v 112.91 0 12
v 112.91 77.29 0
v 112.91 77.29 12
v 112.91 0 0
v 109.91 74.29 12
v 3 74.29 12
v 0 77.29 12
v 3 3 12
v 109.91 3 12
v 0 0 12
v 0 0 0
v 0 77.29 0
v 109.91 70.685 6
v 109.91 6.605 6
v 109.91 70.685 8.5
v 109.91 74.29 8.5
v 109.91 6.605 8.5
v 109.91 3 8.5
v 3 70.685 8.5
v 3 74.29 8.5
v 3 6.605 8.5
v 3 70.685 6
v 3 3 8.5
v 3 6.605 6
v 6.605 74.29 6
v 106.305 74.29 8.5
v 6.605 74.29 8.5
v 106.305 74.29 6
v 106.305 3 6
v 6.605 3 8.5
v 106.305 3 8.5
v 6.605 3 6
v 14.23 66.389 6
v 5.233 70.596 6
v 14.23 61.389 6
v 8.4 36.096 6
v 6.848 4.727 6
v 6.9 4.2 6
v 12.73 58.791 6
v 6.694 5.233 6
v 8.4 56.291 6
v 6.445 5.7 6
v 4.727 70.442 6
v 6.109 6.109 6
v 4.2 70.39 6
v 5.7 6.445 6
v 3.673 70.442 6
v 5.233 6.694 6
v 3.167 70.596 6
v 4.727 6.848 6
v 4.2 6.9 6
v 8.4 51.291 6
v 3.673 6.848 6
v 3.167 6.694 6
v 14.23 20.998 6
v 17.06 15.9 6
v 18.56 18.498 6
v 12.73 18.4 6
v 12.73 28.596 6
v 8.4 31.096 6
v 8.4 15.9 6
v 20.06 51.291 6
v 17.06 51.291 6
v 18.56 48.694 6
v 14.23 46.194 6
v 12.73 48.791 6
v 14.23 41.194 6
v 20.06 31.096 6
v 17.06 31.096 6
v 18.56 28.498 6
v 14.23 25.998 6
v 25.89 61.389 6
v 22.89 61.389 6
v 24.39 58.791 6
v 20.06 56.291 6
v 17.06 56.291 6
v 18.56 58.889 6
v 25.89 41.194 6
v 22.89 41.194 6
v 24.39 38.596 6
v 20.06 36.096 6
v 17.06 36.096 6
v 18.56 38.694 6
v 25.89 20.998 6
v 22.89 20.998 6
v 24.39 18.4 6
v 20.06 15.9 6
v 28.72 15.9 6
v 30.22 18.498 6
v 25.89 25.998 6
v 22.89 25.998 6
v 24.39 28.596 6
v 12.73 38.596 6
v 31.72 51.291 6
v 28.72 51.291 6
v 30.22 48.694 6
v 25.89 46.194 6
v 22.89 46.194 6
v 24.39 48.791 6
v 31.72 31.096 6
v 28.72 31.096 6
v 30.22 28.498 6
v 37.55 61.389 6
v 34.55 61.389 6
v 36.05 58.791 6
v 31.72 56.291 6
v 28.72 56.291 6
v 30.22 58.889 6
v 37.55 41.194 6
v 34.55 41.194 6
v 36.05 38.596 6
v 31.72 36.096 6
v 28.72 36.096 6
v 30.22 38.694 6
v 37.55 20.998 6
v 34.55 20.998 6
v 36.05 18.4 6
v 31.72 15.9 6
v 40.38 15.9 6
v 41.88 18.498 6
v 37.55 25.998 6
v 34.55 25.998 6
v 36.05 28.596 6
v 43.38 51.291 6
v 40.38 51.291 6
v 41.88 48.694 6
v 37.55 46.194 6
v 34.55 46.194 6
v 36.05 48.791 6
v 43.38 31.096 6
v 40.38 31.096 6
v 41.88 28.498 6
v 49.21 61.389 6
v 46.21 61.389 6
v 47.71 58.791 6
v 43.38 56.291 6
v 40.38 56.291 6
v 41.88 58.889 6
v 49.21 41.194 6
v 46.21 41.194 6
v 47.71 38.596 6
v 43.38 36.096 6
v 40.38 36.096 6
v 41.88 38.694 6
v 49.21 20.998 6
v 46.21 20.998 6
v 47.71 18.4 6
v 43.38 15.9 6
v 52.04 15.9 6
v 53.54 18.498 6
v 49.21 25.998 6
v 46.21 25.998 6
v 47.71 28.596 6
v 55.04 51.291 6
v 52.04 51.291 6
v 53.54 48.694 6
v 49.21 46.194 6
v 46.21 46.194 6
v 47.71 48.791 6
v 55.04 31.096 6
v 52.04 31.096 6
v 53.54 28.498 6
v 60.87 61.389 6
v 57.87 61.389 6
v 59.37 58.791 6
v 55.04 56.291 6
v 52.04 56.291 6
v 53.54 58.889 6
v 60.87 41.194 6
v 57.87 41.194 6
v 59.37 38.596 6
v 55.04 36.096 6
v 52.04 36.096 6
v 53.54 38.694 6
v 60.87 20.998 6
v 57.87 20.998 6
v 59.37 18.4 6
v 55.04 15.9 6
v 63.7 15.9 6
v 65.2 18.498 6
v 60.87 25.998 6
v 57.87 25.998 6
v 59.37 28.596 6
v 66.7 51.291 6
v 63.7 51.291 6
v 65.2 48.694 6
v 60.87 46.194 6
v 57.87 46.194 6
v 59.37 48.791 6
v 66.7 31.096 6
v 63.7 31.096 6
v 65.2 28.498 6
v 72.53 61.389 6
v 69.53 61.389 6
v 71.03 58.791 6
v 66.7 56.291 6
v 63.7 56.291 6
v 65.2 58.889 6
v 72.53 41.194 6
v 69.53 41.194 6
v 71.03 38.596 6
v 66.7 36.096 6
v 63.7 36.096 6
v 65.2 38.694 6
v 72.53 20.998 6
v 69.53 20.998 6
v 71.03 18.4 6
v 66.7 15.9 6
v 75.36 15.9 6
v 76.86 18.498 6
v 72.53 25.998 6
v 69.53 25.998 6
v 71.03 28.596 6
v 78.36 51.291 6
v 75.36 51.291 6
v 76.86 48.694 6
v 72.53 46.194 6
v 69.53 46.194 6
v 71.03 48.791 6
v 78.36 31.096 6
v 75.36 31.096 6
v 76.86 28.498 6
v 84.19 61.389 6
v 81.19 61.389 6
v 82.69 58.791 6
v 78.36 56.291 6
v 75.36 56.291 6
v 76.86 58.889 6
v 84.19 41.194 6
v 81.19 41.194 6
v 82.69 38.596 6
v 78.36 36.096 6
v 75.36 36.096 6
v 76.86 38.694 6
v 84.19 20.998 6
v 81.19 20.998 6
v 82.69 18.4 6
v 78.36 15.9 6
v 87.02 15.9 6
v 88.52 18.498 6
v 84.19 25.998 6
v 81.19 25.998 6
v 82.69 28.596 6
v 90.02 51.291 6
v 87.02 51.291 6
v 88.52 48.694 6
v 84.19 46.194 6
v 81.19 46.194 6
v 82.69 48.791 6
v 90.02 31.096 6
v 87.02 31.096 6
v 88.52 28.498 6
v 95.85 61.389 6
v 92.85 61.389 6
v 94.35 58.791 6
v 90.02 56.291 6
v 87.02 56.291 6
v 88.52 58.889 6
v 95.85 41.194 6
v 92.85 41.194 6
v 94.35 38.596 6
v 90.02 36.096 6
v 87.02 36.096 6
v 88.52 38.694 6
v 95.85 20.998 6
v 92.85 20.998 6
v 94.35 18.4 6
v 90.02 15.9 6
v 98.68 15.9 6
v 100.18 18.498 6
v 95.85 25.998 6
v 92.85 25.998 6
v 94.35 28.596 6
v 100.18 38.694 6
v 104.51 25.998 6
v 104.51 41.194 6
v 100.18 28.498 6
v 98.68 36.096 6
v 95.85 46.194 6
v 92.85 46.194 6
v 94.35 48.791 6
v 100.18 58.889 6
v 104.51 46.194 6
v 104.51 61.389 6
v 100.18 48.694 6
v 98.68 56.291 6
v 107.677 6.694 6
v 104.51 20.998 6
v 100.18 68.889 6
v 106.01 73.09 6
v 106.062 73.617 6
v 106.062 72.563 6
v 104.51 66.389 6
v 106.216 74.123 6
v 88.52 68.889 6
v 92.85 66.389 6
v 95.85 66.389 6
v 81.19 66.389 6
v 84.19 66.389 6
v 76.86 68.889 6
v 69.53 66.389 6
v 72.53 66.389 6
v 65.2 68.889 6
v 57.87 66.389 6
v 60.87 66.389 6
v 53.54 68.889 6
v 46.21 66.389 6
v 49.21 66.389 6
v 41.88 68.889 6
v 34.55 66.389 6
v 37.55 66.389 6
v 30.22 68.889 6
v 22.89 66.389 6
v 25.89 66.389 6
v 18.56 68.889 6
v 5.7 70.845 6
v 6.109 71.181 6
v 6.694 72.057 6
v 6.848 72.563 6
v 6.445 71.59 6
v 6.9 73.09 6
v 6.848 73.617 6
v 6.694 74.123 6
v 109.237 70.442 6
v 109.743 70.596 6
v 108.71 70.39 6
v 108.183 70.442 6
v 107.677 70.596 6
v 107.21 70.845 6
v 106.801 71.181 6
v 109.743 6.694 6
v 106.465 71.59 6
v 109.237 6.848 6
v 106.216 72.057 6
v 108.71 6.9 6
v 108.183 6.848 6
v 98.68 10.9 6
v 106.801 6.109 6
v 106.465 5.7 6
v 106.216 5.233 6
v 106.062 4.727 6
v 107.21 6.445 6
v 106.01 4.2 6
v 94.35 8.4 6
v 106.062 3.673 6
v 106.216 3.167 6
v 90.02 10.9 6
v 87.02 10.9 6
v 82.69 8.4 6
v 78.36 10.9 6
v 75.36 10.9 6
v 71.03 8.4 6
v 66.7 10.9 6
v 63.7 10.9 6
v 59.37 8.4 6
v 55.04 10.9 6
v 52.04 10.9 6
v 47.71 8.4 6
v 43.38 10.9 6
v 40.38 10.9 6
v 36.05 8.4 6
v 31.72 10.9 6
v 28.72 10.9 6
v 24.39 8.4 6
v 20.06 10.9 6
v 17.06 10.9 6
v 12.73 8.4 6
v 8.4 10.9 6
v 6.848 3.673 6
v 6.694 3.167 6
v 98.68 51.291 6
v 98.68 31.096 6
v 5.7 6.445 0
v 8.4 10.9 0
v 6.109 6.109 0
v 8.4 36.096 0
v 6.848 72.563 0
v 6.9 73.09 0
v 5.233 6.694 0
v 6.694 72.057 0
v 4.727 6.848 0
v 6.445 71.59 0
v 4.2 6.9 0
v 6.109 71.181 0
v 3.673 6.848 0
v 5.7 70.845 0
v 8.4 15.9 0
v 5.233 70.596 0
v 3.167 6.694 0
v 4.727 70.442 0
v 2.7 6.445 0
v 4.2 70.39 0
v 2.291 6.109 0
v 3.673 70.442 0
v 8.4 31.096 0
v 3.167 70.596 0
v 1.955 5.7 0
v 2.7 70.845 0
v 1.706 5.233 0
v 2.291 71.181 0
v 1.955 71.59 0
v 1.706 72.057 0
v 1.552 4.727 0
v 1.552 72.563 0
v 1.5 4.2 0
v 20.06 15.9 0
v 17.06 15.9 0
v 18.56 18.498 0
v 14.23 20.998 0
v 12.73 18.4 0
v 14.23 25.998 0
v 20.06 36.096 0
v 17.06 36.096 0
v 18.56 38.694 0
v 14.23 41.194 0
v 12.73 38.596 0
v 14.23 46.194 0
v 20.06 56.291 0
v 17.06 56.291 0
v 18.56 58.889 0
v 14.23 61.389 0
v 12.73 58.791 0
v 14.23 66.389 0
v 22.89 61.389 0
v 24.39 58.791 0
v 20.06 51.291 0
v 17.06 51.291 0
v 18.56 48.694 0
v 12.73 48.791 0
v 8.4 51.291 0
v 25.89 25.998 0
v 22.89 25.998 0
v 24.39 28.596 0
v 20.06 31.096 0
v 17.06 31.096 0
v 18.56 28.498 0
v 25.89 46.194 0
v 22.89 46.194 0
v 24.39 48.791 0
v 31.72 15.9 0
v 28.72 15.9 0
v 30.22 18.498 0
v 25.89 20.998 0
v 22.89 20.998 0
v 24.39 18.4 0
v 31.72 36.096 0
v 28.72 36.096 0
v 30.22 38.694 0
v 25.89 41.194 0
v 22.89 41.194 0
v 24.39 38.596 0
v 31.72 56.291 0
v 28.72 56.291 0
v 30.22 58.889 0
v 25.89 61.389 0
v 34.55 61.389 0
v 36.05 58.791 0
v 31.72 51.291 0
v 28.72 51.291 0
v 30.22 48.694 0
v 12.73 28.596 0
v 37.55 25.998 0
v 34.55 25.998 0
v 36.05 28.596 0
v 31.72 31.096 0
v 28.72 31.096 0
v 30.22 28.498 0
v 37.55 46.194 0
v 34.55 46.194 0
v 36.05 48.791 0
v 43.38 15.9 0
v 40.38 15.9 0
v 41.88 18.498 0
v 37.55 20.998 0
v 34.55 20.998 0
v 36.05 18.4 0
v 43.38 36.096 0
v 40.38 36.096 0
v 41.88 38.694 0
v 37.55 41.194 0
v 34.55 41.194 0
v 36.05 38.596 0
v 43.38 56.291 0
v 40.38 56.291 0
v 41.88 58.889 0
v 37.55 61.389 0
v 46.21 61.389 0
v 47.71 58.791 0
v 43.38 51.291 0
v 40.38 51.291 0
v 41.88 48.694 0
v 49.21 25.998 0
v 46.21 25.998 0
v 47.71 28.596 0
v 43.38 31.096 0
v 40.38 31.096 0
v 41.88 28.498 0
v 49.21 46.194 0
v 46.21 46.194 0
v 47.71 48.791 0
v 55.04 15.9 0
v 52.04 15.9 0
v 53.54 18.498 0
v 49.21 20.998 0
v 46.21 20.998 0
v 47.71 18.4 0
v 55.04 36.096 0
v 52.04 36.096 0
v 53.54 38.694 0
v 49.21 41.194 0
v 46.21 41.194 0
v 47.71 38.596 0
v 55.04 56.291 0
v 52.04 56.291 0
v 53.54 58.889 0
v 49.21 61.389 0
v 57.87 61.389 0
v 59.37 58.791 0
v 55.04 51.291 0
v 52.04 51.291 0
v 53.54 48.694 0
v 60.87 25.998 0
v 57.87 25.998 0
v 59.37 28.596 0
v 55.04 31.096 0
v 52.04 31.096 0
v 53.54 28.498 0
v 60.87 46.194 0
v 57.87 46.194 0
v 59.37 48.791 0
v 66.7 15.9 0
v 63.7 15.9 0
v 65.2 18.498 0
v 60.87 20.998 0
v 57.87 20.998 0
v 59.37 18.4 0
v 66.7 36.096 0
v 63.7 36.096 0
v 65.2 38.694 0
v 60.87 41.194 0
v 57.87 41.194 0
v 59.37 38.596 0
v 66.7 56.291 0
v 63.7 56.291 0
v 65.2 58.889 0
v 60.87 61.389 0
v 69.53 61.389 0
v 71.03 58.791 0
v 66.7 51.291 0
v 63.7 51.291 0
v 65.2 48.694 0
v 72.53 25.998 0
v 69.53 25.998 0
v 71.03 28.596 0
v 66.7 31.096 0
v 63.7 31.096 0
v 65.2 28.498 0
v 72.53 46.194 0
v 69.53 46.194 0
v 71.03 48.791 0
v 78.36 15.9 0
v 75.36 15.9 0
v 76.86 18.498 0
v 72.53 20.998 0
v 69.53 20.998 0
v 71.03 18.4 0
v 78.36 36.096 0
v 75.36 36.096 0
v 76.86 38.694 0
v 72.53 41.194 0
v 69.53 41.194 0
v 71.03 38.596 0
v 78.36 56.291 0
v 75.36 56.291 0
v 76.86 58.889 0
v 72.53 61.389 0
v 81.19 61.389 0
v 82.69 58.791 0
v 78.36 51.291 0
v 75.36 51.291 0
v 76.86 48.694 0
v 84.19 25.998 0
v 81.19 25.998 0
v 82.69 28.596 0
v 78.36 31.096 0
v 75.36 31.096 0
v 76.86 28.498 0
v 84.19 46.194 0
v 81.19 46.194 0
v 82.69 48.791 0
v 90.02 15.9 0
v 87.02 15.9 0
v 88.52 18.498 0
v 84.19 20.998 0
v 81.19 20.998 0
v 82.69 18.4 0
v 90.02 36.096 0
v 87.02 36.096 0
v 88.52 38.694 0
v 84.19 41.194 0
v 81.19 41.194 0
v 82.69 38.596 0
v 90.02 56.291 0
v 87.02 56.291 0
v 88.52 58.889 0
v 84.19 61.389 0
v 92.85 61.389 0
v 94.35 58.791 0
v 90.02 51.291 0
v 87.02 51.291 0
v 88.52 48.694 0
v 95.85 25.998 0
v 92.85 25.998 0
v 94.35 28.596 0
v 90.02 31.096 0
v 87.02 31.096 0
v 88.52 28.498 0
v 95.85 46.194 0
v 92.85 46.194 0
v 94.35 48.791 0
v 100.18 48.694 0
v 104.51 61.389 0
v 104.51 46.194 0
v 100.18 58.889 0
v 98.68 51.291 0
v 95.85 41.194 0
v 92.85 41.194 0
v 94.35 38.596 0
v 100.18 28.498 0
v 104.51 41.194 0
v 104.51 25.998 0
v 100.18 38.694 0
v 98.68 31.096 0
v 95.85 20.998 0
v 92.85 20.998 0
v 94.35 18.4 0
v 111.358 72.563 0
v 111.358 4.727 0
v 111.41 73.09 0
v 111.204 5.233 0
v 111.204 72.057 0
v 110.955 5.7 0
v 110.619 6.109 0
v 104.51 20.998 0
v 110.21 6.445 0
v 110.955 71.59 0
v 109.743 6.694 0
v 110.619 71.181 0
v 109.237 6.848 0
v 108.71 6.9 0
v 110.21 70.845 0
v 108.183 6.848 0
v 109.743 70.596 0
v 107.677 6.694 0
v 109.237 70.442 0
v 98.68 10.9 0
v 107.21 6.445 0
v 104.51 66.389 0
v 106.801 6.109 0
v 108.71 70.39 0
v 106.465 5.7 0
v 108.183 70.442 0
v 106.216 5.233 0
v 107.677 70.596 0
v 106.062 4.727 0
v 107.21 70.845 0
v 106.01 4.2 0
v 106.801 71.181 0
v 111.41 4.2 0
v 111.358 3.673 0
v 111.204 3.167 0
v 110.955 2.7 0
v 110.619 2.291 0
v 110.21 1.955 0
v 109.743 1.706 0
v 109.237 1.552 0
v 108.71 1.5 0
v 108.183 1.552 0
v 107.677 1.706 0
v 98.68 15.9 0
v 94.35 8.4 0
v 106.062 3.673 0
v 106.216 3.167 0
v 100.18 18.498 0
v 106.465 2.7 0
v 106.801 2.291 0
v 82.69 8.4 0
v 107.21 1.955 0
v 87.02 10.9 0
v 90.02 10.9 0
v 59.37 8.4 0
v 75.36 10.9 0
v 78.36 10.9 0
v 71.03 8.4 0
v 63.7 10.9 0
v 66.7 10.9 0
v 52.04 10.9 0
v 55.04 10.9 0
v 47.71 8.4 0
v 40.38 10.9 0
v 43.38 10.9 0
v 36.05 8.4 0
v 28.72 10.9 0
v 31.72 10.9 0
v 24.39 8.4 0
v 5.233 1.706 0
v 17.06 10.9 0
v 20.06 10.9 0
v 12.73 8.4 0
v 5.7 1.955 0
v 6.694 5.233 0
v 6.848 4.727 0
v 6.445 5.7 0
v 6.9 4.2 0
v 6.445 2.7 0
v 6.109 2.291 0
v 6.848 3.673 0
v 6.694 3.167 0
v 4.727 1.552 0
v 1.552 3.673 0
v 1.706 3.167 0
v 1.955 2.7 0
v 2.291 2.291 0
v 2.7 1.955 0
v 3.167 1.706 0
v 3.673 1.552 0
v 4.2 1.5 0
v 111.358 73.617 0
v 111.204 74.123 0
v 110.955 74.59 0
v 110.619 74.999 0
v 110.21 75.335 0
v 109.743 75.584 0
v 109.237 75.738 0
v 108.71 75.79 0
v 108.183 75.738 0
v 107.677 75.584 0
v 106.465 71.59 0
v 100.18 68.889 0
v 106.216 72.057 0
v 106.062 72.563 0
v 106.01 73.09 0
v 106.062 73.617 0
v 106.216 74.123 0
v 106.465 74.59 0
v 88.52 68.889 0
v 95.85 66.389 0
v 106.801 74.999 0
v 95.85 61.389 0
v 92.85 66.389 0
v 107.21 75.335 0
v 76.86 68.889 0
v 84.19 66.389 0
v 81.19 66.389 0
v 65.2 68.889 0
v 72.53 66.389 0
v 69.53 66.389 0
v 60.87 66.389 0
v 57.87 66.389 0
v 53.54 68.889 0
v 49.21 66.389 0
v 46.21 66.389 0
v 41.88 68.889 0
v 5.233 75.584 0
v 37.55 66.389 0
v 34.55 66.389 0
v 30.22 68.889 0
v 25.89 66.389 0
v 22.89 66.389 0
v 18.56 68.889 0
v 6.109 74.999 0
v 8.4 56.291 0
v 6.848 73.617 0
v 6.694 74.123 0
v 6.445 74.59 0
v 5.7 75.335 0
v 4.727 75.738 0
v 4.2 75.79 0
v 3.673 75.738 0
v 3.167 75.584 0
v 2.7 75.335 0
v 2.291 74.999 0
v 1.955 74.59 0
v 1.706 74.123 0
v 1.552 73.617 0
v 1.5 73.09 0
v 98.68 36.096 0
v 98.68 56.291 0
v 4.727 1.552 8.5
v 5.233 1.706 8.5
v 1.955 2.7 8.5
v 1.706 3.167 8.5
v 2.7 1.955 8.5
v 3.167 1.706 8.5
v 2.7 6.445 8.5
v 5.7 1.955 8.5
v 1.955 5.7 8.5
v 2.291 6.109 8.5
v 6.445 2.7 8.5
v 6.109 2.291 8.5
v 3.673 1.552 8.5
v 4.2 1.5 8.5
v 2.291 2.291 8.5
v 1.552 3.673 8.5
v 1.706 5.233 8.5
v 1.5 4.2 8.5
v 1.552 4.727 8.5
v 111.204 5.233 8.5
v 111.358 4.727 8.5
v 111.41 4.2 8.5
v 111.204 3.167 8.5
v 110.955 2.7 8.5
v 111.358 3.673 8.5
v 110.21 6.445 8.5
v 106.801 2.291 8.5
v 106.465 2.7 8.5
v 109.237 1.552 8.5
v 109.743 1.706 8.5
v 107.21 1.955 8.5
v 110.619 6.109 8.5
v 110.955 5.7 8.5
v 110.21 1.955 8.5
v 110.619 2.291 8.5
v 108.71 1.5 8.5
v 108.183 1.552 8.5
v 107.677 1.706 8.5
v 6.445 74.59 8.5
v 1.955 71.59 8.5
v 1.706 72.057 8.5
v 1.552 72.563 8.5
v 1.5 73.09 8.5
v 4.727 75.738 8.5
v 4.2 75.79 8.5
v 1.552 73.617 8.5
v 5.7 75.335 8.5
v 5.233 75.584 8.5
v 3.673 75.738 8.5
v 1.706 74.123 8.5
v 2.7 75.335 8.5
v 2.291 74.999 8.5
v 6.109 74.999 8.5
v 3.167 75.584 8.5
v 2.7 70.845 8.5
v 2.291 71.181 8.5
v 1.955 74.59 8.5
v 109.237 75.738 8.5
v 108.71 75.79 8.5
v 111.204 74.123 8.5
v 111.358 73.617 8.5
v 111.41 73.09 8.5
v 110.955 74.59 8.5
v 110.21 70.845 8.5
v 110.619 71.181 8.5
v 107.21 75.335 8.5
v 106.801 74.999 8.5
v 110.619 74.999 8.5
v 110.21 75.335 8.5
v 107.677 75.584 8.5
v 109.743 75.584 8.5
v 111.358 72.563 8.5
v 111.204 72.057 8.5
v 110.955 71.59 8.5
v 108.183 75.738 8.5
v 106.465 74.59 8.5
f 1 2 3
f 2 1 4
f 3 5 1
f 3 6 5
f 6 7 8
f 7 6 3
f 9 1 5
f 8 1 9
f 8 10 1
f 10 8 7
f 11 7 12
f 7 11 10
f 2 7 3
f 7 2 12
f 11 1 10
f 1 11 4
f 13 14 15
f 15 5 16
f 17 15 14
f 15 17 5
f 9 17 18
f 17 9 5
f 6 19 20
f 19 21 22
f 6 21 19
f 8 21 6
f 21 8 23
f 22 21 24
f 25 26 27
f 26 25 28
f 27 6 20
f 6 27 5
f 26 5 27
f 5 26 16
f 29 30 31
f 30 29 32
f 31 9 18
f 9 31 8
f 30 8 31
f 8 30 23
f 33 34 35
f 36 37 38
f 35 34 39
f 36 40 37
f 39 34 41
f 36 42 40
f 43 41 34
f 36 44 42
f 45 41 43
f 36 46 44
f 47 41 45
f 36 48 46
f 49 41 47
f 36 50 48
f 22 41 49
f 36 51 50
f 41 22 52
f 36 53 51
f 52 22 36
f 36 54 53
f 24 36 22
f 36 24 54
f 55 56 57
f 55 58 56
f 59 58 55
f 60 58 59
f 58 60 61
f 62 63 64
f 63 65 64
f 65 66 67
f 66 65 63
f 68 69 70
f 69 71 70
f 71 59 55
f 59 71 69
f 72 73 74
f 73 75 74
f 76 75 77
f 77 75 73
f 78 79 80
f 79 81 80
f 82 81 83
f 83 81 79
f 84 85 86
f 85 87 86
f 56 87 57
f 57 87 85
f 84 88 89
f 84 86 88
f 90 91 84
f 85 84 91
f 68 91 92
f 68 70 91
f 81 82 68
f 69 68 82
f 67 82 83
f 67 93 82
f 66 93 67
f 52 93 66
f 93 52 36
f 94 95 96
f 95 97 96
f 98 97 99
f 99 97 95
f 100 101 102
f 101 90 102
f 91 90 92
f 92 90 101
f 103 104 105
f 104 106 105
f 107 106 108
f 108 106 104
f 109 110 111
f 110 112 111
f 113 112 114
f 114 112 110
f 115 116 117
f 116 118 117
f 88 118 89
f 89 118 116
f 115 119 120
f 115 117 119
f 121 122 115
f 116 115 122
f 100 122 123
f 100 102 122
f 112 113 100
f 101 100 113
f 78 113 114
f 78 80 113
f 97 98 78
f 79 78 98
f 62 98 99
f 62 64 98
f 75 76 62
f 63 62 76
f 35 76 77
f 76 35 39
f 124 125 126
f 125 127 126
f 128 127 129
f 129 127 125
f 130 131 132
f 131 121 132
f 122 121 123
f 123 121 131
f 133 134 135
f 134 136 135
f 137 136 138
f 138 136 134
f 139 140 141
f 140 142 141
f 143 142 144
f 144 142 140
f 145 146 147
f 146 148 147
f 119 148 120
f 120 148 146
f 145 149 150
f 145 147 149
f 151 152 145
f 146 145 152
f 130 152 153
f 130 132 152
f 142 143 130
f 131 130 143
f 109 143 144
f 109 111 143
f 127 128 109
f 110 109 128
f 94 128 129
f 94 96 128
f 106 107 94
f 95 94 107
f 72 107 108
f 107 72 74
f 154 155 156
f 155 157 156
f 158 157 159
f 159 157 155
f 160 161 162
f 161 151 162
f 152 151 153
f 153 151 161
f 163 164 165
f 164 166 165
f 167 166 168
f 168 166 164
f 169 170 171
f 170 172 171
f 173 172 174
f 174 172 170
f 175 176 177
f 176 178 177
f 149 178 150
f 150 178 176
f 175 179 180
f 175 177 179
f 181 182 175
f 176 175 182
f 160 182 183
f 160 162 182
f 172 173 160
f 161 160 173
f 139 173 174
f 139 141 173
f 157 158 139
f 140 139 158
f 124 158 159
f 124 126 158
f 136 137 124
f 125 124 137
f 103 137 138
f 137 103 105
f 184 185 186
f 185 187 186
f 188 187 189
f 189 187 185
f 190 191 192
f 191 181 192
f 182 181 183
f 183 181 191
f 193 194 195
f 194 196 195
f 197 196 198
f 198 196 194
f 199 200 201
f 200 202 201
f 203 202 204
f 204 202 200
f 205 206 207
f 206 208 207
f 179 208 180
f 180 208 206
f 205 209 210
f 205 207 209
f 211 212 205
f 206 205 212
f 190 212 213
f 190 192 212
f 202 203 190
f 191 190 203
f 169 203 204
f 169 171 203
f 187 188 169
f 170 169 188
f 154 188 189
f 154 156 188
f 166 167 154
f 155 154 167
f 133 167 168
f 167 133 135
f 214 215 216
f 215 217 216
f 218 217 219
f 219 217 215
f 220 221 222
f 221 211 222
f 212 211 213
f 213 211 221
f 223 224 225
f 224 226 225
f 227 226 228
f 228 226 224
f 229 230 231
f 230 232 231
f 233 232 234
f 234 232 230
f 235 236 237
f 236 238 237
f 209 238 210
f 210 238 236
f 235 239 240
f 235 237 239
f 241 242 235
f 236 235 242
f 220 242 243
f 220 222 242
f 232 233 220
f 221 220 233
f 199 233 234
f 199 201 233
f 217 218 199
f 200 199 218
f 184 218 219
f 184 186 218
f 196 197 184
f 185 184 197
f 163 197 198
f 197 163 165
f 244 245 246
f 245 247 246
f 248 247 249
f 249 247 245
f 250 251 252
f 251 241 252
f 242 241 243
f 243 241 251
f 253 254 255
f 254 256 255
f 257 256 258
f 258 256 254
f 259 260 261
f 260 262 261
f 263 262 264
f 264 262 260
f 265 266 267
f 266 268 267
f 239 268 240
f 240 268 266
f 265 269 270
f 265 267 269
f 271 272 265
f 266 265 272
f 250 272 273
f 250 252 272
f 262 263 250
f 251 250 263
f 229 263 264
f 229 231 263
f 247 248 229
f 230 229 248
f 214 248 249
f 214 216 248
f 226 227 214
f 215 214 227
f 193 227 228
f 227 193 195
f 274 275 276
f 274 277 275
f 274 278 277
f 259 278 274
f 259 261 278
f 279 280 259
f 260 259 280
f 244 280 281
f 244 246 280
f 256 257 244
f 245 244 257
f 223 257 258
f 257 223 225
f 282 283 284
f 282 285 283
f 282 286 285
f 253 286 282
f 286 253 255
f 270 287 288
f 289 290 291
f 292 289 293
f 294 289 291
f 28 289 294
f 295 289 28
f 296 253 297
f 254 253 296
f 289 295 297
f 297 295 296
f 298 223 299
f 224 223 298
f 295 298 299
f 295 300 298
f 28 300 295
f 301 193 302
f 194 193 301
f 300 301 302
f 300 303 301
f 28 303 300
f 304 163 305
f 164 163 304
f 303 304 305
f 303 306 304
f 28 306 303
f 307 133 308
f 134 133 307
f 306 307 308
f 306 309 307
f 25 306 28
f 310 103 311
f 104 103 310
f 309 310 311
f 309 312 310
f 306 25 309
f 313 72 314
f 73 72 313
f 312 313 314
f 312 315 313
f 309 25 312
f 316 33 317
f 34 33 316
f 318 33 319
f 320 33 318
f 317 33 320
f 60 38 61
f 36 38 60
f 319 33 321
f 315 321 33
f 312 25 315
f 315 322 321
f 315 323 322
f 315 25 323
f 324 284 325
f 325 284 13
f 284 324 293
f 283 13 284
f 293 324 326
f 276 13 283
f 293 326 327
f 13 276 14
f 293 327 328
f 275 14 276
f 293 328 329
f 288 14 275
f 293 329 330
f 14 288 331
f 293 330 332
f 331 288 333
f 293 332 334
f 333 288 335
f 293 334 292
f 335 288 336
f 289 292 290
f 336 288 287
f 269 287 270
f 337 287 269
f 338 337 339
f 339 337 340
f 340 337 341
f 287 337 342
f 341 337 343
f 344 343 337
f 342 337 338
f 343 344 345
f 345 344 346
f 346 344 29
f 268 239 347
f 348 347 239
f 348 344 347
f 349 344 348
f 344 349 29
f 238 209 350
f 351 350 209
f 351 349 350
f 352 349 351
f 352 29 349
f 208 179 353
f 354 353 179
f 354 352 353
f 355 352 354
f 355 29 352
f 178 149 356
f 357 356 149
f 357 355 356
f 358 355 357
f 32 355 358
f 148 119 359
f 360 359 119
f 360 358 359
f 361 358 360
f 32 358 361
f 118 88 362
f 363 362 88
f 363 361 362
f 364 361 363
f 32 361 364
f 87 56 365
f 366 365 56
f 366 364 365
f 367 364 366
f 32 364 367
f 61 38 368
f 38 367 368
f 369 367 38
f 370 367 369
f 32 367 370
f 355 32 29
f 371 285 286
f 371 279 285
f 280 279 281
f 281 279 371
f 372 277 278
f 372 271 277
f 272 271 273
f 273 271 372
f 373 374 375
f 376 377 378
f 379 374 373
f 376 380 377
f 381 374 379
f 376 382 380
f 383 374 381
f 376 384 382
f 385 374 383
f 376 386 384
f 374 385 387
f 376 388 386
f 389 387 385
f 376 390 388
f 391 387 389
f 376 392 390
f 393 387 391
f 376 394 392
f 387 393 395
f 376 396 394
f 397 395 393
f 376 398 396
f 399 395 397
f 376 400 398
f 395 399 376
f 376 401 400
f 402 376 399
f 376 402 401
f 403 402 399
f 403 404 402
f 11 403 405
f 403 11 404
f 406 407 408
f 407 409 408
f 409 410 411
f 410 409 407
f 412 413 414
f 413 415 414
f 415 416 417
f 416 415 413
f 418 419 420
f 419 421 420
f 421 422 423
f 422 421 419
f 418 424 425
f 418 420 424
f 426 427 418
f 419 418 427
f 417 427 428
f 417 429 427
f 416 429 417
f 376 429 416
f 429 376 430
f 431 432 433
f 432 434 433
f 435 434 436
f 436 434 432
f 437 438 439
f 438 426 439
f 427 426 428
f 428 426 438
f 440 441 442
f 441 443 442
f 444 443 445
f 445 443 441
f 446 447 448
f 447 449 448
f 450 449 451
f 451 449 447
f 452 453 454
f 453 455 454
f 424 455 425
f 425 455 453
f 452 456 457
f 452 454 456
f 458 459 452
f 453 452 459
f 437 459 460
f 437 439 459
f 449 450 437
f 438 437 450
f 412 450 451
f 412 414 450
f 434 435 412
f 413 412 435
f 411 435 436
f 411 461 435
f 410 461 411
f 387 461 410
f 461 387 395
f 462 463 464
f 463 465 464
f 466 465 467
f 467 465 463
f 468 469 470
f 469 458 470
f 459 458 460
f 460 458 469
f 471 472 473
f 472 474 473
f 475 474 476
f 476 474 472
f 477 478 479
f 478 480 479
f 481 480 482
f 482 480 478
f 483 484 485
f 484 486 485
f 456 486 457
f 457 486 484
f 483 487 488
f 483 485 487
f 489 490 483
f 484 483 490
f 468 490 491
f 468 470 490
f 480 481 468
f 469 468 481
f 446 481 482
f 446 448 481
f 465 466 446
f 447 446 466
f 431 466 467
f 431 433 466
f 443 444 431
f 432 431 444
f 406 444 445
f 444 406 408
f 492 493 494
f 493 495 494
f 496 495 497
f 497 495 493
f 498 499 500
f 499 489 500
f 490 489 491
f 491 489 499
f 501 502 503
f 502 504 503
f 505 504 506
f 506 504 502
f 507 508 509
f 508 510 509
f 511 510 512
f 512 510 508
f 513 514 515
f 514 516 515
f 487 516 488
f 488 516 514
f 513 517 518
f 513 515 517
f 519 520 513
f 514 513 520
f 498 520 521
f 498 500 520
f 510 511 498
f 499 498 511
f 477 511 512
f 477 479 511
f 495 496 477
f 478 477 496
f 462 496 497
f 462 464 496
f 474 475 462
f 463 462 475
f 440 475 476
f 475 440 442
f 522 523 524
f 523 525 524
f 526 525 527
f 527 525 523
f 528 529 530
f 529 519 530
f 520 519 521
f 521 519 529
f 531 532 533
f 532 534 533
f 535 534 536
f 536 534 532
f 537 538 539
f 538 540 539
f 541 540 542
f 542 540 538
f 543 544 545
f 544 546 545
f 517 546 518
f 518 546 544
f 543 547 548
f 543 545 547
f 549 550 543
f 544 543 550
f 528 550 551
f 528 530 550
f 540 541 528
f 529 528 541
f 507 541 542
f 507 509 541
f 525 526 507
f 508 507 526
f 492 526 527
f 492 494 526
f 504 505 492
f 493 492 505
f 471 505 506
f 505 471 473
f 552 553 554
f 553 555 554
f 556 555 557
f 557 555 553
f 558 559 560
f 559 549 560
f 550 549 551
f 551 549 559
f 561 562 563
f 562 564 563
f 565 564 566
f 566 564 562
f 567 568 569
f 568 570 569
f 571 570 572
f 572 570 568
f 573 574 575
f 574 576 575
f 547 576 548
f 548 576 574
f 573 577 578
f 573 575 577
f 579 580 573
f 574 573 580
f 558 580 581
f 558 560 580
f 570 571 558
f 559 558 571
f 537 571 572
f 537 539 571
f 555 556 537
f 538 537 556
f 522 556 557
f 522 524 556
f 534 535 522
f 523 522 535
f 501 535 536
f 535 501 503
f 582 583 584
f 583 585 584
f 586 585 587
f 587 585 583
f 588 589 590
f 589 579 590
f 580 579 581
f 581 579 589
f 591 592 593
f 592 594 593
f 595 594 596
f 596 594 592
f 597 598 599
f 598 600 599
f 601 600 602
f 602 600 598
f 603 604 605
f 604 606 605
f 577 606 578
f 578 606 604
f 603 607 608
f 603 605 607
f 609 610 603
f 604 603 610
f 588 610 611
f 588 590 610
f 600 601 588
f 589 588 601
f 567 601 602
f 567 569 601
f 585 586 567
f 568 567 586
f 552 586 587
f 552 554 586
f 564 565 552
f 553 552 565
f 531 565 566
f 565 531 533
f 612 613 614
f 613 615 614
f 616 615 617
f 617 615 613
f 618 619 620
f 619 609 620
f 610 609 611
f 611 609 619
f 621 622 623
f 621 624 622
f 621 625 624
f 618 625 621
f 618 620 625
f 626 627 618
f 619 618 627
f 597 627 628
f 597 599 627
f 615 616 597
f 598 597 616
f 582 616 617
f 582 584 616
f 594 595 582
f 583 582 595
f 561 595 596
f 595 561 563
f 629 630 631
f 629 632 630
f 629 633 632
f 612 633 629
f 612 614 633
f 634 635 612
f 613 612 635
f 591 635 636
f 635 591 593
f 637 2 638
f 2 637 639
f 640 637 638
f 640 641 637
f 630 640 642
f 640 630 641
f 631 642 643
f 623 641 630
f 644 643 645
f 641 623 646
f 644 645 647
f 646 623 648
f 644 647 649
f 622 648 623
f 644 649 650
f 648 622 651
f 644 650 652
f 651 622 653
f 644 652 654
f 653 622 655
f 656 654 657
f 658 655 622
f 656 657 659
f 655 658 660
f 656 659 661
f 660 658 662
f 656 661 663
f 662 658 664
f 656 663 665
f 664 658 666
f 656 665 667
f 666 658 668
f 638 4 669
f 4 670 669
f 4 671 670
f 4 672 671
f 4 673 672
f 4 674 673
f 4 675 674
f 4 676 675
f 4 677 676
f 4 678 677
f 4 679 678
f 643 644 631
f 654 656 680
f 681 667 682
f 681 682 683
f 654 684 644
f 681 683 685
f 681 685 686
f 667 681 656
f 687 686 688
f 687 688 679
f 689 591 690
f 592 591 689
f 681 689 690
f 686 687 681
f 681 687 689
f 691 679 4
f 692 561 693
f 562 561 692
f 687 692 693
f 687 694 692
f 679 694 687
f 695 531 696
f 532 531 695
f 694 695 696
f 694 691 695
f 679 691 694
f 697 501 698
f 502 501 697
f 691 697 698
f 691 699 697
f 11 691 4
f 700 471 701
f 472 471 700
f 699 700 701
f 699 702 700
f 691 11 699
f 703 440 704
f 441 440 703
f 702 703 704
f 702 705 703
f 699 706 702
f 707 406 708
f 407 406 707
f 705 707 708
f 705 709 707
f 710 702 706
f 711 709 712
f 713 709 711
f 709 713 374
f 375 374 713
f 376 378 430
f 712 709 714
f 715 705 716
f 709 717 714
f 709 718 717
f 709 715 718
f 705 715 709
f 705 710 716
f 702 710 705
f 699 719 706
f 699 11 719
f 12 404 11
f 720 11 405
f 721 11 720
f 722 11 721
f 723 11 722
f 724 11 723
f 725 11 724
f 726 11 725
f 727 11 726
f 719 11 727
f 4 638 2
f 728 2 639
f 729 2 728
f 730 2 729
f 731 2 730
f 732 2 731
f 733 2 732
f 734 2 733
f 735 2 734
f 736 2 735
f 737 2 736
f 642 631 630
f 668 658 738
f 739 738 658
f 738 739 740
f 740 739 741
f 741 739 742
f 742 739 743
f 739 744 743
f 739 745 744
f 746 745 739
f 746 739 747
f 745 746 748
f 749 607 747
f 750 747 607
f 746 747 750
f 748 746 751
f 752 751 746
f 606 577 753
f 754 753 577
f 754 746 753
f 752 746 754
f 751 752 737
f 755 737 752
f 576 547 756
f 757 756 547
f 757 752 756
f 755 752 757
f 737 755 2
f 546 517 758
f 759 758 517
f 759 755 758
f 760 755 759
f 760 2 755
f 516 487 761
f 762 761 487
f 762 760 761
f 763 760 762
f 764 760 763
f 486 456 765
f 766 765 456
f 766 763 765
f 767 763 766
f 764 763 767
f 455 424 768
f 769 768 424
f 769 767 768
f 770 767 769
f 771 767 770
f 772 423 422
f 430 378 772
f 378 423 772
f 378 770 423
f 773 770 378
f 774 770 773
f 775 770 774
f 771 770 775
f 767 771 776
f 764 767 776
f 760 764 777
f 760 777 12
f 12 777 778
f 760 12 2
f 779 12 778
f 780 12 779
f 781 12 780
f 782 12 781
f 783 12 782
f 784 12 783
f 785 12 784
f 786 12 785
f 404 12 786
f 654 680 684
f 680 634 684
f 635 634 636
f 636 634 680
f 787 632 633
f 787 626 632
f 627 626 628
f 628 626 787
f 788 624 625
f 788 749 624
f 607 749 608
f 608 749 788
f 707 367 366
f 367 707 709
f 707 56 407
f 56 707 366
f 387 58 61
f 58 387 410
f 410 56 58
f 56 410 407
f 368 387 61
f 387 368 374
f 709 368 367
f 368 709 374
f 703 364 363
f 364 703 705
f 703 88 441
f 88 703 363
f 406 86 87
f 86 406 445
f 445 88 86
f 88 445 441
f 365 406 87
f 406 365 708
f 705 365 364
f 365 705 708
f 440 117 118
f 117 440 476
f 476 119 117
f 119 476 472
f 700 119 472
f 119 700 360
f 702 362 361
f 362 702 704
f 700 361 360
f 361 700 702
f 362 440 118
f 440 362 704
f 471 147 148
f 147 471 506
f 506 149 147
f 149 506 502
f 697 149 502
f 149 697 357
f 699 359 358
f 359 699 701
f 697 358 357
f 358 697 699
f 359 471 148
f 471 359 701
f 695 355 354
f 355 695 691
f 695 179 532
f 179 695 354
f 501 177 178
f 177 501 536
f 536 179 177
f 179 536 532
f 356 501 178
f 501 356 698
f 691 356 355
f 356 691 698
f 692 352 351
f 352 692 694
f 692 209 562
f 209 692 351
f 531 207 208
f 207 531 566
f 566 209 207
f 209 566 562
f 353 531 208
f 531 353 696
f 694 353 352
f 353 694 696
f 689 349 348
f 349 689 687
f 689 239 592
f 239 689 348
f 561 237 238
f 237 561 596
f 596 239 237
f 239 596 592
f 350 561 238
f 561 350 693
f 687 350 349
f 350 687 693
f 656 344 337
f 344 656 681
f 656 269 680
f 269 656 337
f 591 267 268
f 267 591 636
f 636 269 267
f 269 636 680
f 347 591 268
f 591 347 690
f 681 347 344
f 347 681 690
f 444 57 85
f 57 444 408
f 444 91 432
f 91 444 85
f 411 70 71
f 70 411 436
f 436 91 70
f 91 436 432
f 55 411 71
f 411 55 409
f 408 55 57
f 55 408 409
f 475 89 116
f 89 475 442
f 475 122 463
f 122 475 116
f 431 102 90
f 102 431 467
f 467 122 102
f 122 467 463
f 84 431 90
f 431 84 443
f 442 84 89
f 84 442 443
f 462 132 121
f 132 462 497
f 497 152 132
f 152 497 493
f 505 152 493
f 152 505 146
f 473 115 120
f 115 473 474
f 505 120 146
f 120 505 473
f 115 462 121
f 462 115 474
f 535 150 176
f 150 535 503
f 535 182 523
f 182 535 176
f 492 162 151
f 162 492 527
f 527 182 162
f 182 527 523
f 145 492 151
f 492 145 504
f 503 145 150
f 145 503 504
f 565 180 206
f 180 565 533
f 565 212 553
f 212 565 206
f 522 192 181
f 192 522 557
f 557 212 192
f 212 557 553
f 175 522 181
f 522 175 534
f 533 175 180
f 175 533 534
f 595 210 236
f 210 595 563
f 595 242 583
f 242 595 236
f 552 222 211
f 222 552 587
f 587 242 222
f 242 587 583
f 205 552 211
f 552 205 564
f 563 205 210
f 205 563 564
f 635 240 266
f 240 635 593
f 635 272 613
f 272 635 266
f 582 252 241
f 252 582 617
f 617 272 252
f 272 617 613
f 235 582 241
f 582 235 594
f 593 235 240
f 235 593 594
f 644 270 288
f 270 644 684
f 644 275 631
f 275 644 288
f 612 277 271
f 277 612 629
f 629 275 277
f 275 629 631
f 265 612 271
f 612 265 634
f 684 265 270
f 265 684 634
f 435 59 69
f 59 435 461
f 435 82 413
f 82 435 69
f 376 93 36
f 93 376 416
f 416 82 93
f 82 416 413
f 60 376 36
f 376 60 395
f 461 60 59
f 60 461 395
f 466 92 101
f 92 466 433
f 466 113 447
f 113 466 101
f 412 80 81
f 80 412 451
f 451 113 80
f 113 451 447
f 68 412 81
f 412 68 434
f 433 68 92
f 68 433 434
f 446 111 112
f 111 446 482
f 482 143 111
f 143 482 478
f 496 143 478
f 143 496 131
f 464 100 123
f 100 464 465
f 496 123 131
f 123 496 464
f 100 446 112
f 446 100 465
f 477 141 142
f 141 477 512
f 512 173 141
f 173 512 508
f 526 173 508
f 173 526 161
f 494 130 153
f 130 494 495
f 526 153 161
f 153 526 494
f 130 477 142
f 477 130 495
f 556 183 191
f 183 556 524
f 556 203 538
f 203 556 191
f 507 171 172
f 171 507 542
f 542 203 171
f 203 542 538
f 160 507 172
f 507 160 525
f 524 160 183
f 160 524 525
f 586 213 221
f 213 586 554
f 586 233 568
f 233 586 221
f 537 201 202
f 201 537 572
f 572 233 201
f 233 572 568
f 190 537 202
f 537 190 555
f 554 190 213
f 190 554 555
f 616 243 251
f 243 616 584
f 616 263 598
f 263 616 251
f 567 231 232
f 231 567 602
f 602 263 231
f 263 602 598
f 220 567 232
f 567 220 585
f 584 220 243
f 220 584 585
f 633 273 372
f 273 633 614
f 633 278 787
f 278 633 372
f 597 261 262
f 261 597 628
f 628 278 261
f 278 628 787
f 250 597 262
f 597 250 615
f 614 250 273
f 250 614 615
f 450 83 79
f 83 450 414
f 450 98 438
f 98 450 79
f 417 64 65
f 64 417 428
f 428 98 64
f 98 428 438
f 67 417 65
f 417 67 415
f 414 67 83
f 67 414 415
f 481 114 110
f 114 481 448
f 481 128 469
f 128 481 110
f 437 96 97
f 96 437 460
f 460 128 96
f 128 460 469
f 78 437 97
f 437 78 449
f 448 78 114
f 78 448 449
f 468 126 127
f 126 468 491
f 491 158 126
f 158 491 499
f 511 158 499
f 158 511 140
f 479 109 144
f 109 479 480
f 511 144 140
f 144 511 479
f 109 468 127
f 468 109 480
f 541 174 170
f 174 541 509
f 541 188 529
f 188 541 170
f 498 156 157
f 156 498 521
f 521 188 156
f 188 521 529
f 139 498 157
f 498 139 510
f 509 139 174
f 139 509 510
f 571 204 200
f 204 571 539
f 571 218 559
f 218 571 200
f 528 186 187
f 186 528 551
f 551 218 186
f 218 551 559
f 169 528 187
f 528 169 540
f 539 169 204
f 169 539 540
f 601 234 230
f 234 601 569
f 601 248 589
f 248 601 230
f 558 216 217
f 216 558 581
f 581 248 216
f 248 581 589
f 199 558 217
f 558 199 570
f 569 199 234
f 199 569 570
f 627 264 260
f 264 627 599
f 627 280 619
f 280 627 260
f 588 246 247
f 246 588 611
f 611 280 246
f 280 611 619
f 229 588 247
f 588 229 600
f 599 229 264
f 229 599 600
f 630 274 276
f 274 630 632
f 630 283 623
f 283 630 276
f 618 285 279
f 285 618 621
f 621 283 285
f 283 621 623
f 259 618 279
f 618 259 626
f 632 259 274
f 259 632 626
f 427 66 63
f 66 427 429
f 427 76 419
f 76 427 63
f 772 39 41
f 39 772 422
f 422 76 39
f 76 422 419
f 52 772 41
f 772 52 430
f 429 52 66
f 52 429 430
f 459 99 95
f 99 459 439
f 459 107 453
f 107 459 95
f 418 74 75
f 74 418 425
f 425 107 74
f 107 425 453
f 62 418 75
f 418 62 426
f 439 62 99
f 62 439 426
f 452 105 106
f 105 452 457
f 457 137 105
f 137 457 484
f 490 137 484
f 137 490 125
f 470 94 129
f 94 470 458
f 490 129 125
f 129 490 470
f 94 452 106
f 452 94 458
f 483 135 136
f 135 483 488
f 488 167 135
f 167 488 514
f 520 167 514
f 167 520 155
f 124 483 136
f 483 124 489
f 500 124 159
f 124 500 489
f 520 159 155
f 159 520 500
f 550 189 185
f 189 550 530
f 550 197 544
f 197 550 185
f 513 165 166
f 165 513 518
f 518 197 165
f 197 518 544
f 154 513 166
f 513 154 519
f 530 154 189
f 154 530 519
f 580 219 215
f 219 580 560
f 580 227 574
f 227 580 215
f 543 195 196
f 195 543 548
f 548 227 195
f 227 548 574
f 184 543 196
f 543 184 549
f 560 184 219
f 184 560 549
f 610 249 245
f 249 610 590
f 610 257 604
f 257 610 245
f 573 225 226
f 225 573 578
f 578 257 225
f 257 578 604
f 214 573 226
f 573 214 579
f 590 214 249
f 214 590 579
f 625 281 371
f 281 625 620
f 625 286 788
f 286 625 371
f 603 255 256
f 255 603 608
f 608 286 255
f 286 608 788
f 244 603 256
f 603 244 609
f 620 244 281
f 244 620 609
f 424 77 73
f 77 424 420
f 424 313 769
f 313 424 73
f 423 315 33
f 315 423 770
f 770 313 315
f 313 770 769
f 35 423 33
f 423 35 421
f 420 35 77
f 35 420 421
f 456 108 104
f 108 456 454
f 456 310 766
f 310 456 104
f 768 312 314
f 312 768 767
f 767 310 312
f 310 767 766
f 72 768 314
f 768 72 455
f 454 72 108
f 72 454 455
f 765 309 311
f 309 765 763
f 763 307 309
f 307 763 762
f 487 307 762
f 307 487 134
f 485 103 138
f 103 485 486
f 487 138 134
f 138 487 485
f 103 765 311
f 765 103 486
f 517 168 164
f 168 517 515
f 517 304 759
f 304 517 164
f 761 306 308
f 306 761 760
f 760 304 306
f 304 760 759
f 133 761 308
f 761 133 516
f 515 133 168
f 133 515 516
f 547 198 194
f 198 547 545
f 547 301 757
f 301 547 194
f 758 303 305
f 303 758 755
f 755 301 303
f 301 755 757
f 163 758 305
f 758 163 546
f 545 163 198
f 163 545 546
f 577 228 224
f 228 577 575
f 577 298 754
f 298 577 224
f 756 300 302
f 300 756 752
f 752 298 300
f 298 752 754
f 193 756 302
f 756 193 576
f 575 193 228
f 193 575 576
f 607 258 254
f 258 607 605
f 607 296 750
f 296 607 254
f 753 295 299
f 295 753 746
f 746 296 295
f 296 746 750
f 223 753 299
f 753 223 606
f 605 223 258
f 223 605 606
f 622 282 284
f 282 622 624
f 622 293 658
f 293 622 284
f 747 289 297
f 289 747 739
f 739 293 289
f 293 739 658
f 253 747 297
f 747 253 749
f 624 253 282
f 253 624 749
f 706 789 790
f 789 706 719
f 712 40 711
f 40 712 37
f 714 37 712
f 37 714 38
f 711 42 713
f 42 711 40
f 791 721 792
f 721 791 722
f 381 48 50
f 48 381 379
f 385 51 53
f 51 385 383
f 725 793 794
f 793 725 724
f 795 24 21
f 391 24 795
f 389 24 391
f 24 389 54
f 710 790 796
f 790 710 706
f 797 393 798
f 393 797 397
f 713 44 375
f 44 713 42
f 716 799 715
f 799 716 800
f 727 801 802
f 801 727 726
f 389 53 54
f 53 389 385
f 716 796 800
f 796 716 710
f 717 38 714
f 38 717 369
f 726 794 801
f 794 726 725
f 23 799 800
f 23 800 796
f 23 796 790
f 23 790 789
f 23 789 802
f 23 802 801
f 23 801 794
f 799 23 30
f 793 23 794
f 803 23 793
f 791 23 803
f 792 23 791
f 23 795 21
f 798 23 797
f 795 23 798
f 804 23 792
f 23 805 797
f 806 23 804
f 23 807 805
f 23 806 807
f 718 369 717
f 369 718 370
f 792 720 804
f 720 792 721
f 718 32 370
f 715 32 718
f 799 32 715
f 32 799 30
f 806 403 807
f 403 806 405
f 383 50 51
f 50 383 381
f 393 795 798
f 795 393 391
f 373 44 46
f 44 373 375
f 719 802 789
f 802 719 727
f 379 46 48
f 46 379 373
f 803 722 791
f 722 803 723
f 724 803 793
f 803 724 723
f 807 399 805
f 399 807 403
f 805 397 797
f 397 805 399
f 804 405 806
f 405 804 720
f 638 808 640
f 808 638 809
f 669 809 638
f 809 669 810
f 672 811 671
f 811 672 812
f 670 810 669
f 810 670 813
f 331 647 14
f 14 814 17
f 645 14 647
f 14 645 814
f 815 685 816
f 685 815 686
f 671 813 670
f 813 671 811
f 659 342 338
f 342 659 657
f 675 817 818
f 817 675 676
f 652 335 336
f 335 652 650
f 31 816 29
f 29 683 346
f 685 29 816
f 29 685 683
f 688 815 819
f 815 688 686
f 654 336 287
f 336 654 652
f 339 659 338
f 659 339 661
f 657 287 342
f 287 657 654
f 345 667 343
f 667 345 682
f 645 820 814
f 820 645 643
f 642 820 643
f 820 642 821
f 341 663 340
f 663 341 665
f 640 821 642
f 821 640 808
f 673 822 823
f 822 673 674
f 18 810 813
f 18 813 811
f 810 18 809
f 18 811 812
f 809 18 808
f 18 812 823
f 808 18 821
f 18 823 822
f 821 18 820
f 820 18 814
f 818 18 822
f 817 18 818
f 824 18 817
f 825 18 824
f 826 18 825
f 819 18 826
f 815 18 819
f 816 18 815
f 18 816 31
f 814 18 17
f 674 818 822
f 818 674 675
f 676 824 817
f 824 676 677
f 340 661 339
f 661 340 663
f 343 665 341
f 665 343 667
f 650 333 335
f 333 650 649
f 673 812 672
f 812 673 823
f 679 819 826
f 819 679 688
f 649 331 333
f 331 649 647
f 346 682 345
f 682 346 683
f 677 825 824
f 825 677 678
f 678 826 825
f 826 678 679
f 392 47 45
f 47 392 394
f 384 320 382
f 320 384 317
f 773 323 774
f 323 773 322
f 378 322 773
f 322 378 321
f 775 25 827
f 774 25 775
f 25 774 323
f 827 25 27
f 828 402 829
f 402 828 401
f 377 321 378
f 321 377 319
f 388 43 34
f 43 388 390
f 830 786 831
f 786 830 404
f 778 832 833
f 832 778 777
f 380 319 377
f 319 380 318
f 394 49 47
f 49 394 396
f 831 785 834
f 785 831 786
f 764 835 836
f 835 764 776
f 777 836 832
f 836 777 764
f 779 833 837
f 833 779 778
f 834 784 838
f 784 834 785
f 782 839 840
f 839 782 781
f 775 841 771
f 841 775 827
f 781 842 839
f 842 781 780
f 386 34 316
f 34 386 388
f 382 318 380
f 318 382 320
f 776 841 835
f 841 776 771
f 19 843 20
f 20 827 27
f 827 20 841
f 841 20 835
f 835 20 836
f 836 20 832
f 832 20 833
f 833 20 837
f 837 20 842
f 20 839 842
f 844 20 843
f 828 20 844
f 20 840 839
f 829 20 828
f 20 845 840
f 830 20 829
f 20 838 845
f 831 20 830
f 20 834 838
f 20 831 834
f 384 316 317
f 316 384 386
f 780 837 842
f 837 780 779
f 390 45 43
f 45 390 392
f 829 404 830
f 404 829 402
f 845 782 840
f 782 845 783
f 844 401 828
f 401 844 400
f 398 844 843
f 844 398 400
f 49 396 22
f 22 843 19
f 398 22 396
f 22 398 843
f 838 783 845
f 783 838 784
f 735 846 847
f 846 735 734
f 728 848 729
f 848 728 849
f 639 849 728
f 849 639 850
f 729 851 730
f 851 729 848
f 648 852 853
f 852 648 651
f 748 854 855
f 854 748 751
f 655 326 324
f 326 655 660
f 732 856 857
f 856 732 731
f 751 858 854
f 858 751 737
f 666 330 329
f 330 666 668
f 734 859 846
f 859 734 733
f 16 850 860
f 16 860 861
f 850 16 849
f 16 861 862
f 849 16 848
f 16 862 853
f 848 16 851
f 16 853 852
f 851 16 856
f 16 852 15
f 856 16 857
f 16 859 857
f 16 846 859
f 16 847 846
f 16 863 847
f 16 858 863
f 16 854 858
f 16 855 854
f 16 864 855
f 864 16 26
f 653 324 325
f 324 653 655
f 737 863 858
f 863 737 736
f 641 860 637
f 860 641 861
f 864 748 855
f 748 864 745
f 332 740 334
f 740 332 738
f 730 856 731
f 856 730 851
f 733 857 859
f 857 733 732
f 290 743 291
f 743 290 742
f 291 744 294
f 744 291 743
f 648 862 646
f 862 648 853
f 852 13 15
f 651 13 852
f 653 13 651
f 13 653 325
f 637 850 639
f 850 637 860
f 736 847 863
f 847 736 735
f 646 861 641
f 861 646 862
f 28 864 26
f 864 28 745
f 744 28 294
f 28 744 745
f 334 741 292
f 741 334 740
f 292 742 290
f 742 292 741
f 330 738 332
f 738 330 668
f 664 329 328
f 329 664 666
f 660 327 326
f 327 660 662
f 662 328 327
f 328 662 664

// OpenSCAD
$fn = 32;

// ----------------------------------------------------------------------
// Honeycomb panel: 112.91 x 77.29 mm, 48 cells of 10 mm
// ----------------------------------------------------------------------

// --- parameters (mm) ---
panel_w = 112.91;         // panel width
panel_d = 77.29;          // panel depth
thick = 6;                // panel thickness
cell_r = 5;               // hex cell circumradius
pitch = 11.66;            // hex cell pitch (centre to centre)
web = 3;                  // web between the cells
columns = 8;              // columns of cells
rows = 6;                 // rows of cells
cell_count = 48;          // total cells
shift_x = 12.73;          // first cell offset in x
shift_y = 13.4;           // first cell offset in y
mount_d = 5.4;            // corner mounting holes
hole_off = 4.2;           // mounting hole offset from the corners
rim_h = 12;               // rim height
rim_t = 3;                // rim wall thickness

difference() {
  union() {
    cube([panel_w, panel_d, thick]);
    /* rim around the panel, sunk 1 mm into the plate */
    translate([0, 0, thick - 1]) difference() {
      cube([panel_w, panel_d, rim_h - thick + 1]);
      translate([rim_t, rim_t, -2.5]) cube([panel_w - 2 * rim_t, panel_d - 2 * rim_t, rim_h - thick + 6]);
    }
  }
  /* hexagonal cells, point-up, cut right through the plate */
  for (row = [0 : rows - 1]) {
    for (col = [0 : columns - 1]) {
      translate([shift_x + col * pitch + (row % 2) * pitch / 2, shift_y + row * pitch * 0.866025, -2.5]) rotate([0, 0, 30]) cylinder(h = thick + 5, d = 2 * cell_r, $fn = 6);
    }
  }
  /* corner mounting holes, clear of the outer cell web */
  translate([4.2, 4.2, -2.5]) cylinder(h = thick + 5, d = mount_d);
  translate([108.71, 4.2, -2.5]) cylinder(h = thick + 5, d = mount_d);
  translate([4.2, 73.09, -2.5]) cylinder(h = thick + 5, d = mount_d);
  translate([108.71, 73.09, -2.5]) cylinder(h = thick + 5, d = mount_d);
}
